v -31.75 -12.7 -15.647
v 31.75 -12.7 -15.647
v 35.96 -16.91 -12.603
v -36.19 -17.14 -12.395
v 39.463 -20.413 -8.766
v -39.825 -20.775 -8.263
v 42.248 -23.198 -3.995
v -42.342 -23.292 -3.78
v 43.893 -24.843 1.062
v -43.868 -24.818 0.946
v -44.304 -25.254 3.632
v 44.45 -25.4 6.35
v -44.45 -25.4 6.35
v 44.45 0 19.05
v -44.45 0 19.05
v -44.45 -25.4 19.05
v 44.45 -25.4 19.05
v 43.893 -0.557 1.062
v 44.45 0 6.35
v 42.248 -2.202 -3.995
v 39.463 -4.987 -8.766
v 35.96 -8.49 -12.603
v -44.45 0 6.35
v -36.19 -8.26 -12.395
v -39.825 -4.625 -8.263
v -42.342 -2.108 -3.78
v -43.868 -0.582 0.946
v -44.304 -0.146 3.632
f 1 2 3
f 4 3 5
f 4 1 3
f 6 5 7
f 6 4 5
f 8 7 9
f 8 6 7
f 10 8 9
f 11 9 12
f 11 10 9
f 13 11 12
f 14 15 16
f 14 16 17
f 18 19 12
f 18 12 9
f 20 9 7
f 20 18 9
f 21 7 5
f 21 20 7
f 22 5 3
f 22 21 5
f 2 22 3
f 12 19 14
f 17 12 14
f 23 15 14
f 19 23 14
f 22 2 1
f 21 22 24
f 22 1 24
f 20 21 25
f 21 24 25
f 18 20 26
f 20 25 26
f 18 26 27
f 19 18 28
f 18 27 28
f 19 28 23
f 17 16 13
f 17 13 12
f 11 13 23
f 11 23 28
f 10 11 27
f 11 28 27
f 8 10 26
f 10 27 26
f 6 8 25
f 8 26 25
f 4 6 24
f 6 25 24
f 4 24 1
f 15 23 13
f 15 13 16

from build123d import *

# Parameters (mm, degrees)
F0_W        = 88.9
F0_H        = 38.1
F1_DEPTH    = 25.4
F2_T1_DEPTH = 152.4
F2_T3_DEPTH = 215.9


# Not quite as in the source:
# - a fillet or chamfer that OpenCascade refuses, or shapes differently, is made with other operations: its cross-section is extruded or revolved along the edge and cut away or added


with BuildPart() as f1:
    # F0 (on Front) → F1 (new body)
    with BuildSketch(Plane.XZ):
        Rectangle(F0_W, F0_H)
    extrude(amount=F1_DEPTH)

    # F2: fillet of radius 25.4 on 4 edges, made by hand

    # F2_s2 → F2_t1 (cut)
    with BuildSketch(Plane.XZ.offset(-63.5)):
        with BuildLine():
            ThreePointArc((44.45, 6.35), (37.0105122421, -11.6105122421), (19.05, -19.05))
            Line((19.05, -19.05), (44.45, -19.05))
            Line((44.45, -19.05), (44.45, 6.35))
        make_face()
        with BuildLine():
            ThreePointArc((-44.45, 6.35), (-37.0105122421, -11.6105122421), (-19.05, -19.05))
            Line((-19.05, -19.05), (-44.45, -19.05))
            Line((-44.45, -19.05), (-44.45, 6.35))
        make_face()
    extrude(amount=F2_T1_DEPTH, mode=Mode.SUBTRACT)

    # F2_s4 → F2_t3 (cut)
    with BuildSketch(Plane.YZ.offset(-107.95)):
        with BuildLine():
            ThreePointArc((0, -19.05), (-17.9605122421, -11.6105122421), (-25.4, 6.35))
            Line((-25.4, 6.35), (-25.4, -19.05))
            Line((-25.4, -19.05), (0, -19.05))
        make_face()
        with BuildLine():
            ThreePointArc((-25.4, -19.05), (-7.4394877579, -11.6105122421), (0, 6.35))
            Line((0, 6.35), (0, -19.05))
            Line((0, -19.05), (-25.4, -19.05))
        make_face()
    extrude(amount=F2_T3_DEPTH, mode=Mode.SUBTRACT)


solid = f1.part
